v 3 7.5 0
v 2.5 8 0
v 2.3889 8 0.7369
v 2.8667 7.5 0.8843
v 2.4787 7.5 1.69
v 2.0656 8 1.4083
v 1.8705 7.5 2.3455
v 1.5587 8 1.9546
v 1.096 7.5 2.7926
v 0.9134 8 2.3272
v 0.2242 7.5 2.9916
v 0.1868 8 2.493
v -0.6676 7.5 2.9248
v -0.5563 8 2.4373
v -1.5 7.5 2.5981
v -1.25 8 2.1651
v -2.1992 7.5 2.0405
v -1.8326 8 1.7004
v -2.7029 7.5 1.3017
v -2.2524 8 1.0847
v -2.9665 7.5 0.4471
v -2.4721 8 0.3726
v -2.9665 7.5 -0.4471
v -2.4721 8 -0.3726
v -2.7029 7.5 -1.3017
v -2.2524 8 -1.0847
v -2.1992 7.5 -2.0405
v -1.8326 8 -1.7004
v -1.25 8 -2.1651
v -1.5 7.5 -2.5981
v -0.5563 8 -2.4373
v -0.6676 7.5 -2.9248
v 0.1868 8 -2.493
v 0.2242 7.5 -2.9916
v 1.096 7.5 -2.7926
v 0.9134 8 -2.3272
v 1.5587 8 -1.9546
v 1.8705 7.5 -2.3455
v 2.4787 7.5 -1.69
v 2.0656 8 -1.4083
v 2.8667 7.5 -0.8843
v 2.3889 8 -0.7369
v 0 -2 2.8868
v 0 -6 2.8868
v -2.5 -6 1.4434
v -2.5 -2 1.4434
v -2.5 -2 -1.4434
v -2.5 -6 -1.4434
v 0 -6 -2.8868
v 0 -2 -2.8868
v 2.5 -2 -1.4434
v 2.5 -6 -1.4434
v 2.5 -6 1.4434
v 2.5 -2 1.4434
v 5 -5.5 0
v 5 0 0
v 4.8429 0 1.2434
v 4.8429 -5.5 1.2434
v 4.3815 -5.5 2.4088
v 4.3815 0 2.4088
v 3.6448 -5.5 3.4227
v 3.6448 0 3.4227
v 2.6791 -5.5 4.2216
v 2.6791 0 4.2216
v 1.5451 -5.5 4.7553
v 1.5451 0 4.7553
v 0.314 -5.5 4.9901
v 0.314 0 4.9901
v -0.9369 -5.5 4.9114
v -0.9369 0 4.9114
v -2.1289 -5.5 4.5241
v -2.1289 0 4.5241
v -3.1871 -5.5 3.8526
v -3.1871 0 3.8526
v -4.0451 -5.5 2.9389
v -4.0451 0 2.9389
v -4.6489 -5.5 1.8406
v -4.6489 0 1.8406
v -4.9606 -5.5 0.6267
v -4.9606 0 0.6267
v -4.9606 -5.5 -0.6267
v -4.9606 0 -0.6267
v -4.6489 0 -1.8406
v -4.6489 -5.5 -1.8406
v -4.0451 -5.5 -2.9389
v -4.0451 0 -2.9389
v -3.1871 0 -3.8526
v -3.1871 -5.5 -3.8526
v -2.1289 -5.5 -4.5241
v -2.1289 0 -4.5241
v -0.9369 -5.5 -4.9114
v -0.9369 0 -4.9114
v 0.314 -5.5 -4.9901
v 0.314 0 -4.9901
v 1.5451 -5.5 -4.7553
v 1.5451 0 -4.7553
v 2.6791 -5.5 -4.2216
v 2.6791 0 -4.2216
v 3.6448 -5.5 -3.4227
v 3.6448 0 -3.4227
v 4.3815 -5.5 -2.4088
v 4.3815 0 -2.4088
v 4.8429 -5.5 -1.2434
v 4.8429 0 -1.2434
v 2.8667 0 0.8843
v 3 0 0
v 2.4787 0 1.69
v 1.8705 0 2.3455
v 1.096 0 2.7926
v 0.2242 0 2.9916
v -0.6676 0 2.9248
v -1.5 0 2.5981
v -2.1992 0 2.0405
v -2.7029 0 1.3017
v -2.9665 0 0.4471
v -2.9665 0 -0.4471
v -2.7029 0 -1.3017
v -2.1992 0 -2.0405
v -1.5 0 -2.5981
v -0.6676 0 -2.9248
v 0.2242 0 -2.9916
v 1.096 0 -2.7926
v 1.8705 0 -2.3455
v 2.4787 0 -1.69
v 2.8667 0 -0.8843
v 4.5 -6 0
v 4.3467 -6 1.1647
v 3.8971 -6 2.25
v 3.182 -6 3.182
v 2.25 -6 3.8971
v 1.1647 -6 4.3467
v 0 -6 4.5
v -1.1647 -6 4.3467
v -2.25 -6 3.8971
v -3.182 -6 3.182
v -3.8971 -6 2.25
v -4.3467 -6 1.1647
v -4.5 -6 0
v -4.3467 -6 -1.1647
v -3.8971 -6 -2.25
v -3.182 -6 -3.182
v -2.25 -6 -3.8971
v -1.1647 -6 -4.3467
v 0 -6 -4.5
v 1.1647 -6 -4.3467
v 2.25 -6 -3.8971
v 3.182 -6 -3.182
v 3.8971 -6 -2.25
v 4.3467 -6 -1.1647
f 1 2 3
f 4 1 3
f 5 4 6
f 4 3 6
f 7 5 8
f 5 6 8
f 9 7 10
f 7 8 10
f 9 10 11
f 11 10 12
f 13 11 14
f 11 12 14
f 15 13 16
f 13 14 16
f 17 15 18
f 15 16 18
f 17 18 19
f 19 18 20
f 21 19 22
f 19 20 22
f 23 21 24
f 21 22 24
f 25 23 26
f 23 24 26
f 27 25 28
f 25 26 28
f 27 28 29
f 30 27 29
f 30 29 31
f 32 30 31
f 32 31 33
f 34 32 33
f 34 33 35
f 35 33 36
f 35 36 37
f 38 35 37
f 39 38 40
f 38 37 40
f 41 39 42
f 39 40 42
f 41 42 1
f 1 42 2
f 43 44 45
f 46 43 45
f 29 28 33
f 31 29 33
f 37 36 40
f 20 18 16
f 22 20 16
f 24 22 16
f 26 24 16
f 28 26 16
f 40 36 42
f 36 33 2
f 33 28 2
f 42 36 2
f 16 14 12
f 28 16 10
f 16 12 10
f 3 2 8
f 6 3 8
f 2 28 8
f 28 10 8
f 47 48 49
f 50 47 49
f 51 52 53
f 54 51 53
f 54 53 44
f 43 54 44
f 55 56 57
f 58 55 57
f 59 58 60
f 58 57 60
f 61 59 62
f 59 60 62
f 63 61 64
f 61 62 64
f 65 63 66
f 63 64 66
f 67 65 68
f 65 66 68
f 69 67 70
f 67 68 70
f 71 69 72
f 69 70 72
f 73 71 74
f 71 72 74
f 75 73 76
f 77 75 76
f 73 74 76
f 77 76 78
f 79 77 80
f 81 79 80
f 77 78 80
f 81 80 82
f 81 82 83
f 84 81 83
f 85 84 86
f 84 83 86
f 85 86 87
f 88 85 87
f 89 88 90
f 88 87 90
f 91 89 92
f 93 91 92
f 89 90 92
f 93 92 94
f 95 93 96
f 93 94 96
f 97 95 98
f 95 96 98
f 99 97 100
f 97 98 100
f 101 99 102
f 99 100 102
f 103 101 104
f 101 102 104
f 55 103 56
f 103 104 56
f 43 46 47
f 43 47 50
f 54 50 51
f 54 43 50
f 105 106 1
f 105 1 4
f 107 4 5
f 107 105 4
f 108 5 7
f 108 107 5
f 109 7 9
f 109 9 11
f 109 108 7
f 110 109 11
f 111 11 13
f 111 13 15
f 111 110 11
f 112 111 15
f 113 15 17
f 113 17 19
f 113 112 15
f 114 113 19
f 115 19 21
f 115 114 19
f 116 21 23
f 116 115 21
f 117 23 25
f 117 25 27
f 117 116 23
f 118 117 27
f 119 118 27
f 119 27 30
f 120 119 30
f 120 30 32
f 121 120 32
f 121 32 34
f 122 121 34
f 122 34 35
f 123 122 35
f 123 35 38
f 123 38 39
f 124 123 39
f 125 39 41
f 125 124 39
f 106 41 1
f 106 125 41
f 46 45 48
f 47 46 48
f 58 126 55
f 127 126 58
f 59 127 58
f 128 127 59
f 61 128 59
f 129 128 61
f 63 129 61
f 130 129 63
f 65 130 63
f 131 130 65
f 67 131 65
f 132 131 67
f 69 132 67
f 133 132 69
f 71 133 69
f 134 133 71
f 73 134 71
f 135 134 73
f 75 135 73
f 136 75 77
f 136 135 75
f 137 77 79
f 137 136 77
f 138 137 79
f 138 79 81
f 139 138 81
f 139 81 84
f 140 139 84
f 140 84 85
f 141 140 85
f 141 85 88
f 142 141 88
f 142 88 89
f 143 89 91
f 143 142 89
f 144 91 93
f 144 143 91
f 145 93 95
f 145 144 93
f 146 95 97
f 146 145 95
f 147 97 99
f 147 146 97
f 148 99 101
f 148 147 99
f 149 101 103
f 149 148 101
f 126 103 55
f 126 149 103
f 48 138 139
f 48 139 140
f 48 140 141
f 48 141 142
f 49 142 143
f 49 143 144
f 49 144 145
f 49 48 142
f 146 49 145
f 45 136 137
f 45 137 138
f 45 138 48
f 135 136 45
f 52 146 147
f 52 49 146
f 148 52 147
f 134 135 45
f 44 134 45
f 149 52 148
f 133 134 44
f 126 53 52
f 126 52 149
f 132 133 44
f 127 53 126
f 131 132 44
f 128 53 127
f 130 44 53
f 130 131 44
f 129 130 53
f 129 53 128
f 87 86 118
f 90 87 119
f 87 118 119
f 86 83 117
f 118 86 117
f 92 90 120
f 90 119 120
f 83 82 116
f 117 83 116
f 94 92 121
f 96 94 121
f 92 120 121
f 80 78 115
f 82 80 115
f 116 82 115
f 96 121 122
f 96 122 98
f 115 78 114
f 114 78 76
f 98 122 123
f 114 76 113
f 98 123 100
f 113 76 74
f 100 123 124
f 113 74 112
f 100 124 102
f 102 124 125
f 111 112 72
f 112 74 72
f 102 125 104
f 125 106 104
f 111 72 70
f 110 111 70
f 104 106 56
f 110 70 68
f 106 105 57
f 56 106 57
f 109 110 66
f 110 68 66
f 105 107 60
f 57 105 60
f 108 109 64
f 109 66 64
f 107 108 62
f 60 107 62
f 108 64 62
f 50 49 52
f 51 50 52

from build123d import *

# Parameters (mm, degrees)
F0_R     = 5
F0_R_2   = 3
F1_DEPTH = 6
F2_DEPTH = 8
F3_SIZE  = 0.5
F5_DEPTH = 4


with BuildPart() as f1:
    # F0 (on Front) → F1 (new body)
    with BuildSketch(Plane.XZ):
        Circle(F0_R)
        Circle(F0_R_2, mode=Mode.SUBTRACT)
        Circle(F0_R_2)
    extrude(amount=F1_DEPTH)

    # F0 (on Front) → F2 (join)
    with BuildSketch(Plane.XZ):
        Circle(F0_R_2)
    extrude(amount=-F2_DEPTH)

    # F3
    f3_edges = [f1.edges().sort_by_distance(p)[0] for p in [
        (-5, -6, 0),
        (-3, 8, 0),
    ]]
    chamfer(f3_edges, length=F3_SIZE)

    # F4 (on face) → F5 (cut)
    with BuildSketch(Plane.XZ.offset(6)):
        Polygon((2.5, -1.443376), (2.5, 1.443376), (0, 2.886751), (-2.5, 1.443376), (-2.5, -1.443376), (0, -2.886751), align=None)
    extrude(amount=-F5_DEPTH, mode=Mode.SUBTRACT)


solid = f1.part
